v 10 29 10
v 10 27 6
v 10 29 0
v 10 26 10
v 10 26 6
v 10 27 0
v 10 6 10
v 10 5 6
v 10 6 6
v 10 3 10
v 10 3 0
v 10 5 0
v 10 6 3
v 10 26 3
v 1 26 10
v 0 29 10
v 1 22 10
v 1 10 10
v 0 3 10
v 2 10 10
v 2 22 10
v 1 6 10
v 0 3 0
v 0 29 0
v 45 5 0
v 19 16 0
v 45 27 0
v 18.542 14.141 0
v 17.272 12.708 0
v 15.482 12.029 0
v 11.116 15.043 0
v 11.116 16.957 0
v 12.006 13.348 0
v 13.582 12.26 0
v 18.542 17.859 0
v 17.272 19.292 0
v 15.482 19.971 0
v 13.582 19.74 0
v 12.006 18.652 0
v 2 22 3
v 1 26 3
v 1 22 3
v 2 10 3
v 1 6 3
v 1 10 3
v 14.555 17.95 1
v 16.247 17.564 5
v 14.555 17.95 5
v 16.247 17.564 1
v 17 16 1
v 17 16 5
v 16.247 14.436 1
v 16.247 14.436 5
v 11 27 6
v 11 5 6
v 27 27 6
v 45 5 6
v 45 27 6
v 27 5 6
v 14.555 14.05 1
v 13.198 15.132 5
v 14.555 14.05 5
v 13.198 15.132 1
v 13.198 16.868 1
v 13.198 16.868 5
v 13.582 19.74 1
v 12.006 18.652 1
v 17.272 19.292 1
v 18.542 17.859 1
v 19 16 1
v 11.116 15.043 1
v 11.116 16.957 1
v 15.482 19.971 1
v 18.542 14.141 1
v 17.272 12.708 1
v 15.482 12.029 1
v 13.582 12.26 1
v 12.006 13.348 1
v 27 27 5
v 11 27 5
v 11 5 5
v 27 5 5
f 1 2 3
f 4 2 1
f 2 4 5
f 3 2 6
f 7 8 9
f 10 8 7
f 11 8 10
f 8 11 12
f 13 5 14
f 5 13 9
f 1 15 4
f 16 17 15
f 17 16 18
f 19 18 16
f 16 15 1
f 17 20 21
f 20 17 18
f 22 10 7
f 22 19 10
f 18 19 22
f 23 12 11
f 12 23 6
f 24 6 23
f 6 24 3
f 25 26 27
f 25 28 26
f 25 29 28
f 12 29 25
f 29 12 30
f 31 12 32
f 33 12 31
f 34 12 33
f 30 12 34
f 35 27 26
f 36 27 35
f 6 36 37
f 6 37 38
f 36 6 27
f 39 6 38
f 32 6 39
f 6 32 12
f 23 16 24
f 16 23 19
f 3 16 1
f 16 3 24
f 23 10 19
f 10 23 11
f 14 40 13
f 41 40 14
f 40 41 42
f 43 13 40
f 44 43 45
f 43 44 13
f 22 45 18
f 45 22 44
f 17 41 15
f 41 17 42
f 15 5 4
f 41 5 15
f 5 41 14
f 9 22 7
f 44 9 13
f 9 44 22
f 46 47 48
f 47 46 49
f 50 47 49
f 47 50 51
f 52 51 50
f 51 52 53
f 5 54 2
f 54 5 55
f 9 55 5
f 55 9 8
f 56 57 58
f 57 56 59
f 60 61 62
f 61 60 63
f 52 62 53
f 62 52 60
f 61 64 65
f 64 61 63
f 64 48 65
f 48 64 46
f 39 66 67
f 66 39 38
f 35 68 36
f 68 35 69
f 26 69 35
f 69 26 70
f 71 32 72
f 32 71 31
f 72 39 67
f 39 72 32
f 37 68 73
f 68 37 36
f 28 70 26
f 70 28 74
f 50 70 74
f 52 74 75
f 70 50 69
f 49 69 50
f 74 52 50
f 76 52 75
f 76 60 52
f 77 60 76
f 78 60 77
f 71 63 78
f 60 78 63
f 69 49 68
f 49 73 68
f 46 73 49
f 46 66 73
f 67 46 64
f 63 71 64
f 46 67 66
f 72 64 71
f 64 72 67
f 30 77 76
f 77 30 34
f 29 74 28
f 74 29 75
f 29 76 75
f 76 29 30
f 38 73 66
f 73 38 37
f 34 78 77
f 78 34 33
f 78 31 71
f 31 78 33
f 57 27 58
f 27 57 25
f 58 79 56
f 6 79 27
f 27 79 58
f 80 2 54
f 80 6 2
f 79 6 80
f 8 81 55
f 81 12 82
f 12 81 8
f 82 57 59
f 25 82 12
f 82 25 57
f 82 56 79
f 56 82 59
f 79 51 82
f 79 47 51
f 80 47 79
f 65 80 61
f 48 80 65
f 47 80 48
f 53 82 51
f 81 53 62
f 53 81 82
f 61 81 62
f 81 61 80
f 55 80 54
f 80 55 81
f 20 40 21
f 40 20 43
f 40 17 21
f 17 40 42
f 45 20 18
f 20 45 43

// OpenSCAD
translate ([0,3,0])

difference(){
cube([10,26,10]);
# translate([1,3,3]) 
cube([9,20,8]);
}

translate([10,5,0])

difference(){
difference() {
cube([35,22,6]);
# translate([5,11,0]) {
cylinder(h=6, r=2);
cylinder(h=1, r=4);}
}
#translate([1,0,5]){
cube([16,22,1]);}
}

translate([0,10,0])
cube([2,12,10]);
